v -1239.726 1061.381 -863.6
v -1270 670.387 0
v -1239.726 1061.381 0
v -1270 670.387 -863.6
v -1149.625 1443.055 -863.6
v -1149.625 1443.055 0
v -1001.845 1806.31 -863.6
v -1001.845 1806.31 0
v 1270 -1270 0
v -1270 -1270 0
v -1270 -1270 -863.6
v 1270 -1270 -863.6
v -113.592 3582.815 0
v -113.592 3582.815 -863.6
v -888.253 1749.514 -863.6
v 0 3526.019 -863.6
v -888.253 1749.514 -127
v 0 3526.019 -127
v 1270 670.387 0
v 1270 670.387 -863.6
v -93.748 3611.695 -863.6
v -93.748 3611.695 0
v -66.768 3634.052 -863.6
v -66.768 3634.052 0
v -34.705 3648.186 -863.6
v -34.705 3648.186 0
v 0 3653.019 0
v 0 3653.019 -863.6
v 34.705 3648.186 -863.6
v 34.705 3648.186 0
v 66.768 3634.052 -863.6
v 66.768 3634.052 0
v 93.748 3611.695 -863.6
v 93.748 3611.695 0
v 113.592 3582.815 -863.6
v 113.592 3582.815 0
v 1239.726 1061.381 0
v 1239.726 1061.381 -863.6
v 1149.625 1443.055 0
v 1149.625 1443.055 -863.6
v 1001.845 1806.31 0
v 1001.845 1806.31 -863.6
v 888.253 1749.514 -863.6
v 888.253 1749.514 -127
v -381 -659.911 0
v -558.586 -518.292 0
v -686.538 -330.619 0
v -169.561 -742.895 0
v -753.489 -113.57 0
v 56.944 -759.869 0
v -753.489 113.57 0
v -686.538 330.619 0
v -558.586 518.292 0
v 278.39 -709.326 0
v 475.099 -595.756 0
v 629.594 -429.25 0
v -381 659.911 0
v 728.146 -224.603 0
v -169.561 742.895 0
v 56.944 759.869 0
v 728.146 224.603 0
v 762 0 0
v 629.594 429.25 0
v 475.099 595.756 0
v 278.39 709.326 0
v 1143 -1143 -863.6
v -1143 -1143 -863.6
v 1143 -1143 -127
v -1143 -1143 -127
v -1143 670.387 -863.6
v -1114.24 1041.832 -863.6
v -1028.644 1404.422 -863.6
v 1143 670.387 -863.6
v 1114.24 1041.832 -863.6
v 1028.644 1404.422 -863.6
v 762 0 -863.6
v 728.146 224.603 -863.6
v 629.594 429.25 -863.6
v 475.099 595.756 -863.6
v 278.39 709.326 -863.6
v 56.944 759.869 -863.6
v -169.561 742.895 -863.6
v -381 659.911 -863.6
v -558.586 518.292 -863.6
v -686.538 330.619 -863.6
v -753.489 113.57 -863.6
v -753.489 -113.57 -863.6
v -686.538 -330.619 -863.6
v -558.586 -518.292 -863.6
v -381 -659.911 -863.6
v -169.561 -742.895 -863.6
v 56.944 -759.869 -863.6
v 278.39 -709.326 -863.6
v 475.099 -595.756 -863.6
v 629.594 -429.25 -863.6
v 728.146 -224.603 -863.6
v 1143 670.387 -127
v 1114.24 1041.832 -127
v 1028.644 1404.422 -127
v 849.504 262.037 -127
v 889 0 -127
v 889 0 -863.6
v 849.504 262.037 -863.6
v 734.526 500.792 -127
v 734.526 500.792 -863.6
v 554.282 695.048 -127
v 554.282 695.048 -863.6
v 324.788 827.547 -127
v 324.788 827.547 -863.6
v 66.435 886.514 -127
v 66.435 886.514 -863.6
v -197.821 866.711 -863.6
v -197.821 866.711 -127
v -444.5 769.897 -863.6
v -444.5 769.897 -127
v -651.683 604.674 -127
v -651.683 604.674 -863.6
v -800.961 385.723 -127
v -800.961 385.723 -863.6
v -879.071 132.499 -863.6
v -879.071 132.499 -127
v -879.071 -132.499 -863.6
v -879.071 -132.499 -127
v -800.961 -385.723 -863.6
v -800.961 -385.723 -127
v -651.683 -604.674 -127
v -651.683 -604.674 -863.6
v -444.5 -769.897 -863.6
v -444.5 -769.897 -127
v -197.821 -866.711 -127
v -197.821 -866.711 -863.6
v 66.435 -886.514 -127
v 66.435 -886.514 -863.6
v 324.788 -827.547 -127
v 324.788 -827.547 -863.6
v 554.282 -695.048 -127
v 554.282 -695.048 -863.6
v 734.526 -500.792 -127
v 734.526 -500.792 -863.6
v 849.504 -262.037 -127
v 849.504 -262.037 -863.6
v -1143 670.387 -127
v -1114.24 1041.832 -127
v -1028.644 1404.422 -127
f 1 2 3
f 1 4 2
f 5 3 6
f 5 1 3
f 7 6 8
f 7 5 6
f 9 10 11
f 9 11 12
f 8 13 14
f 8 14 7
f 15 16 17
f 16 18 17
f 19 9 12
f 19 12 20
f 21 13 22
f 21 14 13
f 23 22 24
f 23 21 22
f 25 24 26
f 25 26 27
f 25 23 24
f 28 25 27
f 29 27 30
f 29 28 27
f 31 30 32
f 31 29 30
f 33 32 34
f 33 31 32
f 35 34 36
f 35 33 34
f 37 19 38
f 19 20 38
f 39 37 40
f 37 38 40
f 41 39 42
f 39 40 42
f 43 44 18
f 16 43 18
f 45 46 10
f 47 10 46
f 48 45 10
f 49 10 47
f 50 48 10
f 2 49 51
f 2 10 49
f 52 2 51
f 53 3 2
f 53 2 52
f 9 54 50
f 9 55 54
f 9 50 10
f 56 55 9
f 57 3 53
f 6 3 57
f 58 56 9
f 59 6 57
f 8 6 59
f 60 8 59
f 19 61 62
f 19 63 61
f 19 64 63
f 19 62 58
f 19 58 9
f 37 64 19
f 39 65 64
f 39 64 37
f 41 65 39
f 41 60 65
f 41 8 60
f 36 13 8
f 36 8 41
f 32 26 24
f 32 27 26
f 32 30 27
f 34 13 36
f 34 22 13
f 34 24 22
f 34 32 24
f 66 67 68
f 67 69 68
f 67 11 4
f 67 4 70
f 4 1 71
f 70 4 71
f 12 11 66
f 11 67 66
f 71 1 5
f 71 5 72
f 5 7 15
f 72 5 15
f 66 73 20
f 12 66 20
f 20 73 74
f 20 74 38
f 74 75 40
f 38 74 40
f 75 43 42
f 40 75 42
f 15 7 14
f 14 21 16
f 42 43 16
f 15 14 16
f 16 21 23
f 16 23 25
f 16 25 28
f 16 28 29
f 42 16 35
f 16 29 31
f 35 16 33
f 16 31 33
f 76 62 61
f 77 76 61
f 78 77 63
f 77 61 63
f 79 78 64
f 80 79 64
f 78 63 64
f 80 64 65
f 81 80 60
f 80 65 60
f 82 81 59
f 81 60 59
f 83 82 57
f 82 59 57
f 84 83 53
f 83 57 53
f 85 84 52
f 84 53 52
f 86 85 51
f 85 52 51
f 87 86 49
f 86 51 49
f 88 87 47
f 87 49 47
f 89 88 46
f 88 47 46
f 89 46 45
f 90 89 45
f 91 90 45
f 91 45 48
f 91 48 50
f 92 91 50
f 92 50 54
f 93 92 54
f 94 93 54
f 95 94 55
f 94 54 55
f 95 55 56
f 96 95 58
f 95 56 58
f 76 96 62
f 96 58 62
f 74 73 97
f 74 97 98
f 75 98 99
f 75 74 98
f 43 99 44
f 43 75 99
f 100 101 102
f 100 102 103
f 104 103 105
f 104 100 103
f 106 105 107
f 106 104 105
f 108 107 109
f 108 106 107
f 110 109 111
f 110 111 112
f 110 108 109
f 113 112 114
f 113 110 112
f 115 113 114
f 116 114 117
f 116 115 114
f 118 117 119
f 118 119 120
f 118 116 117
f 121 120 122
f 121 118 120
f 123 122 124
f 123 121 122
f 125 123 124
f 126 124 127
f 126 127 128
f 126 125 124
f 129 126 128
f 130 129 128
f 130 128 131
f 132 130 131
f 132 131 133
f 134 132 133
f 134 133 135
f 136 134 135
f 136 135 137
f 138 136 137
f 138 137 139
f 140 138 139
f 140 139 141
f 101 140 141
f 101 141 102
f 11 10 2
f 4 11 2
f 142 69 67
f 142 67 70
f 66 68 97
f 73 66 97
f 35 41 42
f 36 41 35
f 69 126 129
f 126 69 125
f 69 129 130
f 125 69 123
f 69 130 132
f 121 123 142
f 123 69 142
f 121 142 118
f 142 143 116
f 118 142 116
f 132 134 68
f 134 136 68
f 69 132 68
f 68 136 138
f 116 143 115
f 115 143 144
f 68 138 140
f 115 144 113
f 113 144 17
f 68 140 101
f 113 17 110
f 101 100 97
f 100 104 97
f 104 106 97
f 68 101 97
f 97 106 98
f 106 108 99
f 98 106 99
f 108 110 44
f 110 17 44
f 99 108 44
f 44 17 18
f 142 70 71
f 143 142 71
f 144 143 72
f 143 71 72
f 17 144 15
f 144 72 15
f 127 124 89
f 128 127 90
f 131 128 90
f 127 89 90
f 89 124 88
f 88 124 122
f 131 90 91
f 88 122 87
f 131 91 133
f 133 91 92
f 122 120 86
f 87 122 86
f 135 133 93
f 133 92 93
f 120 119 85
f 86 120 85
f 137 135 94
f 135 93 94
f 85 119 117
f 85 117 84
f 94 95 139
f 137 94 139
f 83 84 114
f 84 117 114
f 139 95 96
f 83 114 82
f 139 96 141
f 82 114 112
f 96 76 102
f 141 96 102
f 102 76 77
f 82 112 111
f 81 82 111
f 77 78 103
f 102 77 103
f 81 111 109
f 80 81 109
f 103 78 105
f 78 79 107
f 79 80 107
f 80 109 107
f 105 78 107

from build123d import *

# Parameters (mm, degrees)
F0_W     = 2540
F0_H     = 2540
F0_R     = 762
F1_DEPTH = 863.6
F2_R     = 2540
F3_T     = -127
F4_R     = 127


with BuildPart() as f1:
    # F0 (on Top) → F1 (new body)
    with BuildSketch(Plane.XY):
        Rectangle(F0_W, F0_H)
        Circle(F0_R, mode=Mode.SUBTRACT)
        Polygon((0, 3810), (-1270, 1270), (1270, 1270), align=None)
    extrude(amount=-F1_DEPTH)

    # F2
    f2_edges = [f1.edges().sort_by_distance(p)[0] for p in [
        (-1270, 1270, -431.8),
        (1270, 1270, -431.8),
    ]]
    fillet(f2_edges, radius=F2_R)

    # F3
    f3_openings = [f1.faces().sort_by_distance(p)[0] for p in [
        (0, 866.718284, -863.6),
    ]]
    offset(amount=F3_T, openings=f3_openings)

    # F4
    f4_edges = [f1.edges().sort_by_distance(p)[0] for p in [
        (0, 3810, -431.8),
    ]]
    fillet(f4_edges, radius=F4_R)


solid = f1.part
